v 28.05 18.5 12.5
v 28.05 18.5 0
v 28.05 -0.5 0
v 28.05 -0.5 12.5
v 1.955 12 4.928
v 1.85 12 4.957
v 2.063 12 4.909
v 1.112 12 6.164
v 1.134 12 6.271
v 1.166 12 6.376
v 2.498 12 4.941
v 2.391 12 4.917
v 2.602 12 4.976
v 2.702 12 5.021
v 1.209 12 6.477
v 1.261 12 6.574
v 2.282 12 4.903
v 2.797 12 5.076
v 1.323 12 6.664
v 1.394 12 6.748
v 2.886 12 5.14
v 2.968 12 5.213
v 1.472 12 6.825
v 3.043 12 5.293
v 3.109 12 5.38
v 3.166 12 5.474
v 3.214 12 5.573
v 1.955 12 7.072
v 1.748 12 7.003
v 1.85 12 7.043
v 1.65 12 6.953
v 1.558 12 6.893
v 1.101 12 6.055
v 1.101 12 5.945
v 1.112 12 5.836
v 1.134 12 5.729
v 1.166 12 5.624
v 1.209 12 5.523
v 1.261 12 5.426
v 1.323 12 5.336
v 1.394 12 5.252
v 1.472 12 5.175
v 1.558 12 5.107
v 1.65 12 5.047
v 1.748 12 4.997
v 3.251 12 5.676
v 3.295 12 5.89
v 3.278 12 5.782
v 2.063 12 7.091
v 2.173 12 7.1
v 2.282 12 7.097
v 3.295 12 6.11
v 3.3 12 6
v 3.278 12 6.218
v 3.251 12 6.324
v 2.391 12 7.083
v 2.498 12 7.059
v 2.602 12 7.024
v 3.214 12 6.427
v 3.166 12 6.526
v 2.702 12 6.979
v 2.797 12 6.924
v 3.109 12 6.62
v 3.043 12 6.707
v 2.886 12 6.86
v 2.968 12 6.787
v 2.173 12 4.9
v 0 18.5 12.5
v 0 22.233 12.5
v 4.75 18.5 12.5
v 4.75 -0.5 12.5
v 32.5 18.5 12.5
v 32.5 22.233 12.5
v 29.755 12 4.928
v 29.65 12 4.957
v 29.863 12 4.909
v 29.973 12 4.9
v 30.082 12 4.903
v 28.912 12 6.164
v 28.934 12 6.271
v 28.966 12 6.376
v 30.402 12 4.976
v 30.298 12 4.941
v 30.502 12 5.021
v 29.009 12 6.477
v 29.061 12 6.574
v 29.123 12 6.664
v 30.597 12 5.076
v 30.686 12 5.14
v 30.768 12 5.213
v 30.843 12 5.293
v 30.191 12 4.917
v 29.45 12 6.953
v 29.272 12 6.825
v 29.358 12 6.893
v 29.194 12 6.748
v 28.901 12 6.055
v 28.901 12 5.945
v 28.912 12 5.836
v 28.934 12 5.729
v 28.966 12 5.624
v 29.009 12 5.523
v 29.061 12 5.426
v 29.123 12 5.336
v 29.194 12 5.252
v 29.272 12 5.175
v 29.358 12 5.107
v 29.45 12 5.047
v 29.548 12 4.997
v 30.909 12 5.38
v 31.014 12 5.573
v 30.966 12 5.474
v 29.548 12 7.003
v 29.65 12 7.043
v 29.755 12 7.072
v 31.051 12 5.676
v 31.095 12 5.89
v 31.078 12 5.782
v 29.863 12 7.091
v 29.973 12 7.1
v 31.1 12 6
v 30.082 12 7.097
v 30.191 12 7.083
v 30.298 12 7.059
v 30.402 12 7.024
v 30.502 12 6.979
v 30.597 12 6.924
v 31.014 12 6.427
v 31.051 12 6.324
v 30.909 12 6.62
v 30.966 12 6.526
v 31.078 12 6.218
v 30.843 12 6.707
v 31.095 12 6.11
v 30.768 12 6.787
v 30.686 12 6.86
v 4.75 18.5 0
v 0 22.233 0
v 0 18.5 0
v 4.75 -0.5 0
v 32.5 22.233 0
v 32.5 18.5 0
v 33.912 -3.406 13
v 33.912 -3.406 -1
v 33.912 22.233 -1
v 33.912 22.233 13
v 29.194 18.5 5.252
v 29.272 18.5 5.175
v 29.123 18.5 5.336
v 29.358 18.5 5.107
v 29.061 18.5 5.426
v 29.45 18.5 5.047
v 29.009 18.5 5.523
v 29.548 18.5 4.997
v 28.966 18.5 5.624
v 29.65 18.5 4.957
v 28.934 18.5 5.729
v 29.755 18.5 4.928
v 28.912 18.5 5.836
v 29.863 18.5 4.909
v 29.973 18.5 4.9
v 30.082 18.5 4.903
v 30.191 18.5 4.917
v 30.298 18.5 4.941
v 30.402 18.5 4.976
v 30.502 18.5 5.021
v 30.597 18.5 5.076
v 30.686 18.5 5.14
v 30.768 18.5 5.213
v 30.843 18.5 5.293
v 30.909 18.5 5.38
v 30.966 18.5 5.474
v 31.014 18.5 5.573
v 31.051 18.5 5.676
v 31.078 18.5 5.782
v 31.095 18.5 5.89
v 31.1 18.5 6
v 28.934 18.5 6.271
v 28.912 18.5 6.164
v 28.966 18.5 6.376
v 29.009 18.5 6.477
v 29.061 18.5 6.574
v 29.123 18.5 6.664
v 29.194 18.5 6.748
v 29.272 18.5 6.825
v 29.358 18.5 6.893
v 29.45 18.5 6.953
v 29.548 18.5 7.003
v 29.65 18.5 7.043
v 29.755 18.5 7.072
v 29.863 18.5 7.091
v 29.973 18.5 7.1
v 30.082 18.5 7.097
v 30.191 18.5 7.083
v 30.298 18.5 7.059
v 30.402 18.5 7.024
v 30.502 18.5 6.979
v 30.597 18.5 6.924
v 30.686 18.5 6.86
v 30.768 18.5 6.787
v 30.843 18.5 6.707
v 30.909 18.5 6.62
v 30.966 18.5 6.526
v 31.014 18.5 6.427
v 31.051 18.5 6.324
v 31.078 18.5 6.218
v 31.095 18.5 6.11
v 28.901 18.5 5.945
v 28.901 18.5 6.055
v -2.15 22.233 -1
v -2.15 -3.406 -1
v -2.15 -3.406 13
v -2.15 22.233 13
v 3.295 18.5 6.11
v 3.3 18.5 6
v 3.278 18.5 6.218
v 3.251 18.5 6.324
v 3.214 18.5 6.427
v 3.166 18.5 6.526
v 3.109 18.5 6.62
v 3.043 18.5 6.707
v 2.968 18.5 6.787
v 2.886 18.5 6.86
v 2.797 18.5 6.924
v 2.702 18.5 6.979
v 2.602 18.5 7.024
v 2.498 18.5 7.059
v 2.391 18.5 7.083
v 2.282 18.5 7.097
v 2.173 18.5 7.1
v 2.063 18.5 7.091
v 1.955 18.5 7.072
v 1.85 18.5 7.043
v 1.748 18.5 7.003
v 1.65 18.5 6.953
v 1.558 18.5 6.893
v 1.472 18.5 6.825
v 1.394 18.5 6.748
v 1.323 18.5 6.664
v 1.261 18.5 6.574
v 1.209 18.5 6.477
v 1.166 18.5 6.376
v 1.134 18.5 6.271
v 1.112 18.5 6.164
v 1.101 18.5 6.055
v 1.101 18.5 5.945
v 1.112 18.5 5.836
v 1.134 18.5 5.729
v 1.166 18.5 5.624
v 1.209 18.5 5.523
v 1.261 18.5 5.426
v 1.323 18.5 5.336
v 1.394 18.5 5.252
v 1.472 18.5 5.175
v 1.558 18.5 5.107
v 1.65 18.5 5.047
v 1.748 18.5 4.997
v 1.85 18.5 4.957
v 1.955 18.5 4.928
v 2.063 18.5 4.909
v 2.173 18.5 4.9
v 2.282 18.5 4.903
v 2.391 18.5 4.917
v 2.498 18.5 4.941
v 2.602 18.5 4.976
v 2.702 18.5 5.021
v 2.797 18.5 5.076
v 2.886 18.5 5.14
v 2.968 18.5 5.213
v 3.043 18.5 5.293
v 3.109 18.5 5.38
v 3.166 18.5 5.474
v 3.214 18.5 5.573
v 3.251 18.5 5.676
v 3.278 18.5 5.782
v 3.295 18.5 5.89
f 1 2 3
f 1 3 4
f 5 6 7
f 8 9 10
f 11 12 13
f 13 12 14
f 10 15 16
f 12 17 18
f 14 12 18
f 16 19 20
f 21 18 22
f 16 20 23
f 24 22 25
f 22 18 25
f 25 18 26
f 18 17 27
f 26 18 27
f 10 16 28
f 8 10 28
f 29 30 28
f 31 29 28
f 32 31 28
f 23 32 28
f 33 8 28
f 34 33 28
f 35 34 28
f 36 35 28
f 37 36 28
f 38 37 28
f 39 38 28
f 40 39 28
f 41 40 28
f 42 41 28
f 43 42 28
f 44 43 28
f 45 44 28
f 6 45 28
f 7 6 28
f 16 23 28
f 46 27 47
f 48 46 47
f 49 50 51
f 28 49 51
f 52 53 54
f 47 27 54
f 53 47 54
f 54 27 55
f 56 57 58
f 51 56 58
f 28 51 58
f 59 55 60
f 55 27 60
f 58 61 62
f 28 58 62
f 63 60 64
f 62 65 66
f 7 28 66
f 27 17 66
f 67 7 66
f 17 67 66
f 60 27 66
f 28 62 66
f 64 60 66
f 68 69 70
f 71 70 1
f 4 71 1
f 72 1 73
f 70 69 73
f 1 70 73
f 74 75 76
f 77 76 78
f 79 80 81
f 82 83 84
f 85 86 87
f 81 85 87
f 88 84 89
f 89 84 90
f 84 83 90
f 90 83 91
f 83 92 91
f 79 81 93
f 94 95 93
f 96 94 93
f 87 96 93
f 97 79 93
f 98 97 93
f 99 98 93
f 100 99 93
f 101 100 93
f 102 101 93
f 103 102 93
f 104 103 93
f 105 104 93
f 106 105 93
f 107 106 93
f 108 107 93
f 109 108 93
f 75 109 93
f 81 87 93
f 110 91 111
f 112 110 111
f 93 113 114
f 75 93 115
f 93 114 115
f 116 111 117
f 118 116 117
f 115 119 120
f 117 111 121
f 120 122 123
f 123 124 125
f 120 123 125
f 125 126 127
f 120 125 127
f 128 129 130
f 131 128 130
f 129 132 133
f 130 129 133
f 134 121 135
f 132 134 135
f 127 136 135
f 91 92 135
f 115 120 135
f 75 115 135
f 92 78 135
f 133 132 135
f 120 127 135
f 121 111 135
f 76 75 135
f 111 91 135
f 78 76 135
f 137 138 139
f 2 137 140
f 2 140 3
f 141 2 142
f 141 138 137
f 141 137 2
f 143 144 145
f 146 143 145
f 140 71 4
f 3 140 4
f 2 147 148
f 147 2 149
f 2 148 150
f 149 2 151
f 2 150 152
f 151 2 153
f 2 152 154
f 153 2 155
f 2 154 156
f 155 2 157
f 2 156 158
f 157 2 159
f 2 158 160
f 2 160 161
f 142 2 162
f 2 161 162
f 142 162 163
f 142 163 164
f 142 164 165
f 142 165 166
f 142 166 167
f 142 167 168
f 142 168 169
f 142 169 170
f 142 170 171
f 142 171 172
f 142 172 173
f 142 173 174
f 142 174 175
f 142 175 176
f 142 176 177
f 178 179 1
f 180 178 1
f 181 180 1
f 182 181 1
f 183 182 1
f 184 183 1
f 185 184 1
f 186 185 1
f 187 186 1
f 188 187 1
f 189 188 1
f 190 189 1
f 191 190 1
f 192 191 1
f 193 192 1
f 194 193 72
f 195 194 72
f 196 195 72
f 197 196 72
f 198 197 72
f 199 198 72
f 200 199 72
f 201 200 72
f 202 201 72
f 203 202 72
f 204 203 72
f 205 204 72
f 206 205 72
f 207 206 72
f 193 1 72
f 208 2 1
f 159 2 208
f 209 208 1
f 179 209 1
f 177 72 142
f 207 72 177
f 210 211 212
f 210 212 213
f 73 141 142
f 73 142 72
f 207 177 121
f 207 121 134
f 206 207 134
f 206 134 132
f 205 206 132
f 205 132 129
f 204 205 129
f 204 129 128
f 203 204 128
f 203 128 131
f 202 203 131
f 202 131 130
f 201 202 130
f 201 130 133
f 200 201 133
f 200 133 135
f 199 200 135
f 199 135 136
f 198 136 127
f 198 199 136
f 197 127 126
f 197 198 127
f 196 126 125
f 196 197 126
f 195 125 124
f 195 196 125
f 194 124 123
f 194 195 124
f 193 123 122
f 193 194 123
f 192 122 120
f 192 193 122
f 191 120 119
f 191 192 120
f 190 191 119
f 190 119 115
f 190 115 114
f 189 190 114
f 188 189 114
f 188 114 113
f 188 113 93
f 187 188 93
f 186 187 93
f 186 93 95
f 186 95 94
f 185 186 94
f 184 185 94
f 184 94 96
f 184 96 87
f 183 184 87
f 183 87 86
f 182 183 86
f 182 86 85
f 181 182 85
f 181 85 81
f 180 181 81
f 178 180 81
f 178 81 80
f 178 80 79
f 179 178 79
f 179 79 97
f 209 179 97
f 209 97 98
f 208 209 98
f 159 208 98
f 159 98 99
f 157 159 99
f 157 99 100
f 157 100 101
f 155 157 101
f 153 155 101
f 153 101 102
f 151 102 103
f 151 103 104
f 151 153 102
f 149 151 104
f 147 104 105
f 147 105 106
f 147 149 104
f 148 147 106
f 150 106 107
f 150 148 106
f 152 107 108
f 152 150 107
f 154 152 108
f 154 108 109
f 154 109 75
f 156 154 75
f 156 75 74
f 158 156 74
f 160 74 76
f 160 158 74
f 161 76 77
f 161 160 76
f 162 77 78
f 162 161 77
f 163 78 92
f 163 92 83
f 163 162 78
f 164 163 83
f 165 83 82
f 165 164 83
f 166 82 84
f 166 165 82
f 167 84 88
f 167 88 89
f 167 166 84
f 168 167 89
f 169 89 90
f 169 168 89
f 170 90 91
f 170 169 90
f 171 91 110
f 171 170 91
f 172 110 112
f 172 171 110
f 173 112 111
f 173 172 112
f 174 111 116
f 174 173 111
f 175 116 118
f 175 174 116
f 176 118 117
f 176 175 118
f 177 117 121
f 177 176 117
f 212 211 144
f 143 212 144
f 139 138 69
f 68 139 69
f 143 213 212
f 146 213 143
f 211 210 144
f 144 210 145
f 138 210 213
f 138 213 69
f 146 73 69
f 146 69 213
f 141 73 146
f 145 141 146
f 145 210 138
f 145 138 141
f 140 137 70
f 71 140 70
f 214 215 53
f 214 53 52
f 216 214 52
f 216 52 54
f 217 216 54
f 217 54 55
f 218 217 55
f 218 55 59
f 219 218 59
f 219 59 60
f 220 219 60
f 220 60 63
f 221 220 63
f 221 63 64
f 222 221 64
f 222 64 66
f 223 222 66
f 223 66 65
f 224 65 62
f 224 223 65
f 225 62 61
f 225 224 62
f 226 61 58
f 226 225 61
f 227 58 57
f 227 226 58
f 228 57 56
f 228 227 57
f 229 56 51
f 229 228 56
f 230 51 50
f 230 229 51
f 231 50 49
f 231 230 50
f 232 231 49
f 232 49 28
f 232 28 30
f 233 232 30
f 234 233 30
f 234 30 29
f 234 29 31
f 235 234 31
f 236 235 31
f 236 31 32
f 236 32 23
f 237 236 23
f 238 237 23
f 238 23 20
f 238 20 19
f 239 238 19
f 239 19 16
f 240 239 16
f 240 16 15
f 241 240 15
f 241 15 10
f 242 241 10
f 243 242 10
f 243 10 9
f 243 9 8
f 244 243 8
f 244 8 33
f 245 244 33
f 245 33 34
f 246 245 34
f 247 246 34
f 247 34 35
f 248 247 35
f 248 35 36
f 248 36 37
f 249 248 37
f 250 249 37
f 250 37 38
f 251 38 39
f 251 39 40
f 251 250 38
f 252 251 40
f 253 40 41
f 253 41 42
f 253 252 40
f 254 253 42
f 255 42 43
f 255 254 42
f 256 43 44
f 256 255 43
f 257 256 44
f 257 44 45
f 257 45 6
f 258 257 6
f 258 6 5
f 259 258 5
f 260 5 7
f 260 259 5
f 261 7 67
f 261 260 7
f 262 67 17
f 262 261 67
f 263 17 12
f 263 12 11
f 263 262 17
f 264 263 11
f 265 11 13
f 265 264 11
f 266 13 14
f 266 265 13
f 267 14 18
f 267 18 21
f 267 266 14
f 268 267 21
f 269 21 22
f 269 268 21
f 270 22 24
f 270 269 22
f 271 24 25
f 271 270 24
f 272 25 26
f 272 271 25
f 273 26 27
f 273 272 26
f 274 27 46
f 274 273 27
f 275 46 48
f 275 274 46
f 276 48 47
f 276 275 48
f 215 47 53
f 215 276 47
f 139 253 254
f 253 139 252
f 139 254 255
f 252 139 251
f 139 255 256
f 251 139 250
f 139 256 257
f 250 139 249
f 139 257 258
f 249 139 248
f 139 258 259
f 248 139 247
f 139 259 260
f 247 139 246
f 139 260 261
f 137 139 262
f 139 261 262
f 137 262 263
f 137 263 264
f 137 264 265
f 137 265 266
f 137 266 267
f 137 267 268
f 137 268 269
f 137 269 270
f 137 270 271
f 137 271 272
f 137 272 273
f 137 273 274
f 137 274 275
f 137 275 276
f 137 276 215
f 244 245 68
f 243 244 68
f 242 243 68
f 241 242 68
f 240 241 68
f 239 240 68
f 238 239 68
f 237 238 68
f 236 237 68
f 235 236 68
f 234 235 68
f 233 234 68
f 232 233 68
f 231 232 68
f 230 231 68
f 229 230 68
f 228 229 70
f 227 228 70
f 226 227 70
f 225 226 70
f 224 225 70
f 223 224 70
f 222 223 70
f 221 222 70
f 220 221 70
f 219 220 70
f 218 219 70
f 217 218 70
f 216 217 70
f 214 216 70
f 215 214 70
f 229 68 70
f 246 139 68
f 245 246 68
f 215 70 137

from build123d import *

# Parameters (mm, degrees)
CYLINDER004_R     = 1.1
CYLINDER004_DEPTH = 10
CYLINDER005_R     = 1.1
CYLINDER005_DEPTH = 10
SKETCH007_W       = 23.3
SKETCH007_H       = 12.5
PAD007_DEPTH      = 19.5
SKETCH005_W       = 32.5
SKETCH005_H       = 12.5
PAD006_DEPTH      = 4.5
SKETCH006_W       = 36.061928
SKETCH006_H       = 25.639376
PAD005_DEPTH      = 14


with BuildPart() as cylinder004:
    # Cylinder004 → Cylinder004 (new body)
    with BuildSketch(Plane(origin=(30, 22, 6), x_dir=(1, 0, 0), z_dir=(0, -1, 0))):
        Circle(CYLINDER004_R)
    extrude(amount=CYLINDER004_DEPTH)


with BuildPart() as tornillossoporteservohollo001:
    # Cylinder005 → Cylinder005 (new body)
    with BuildSketch(Plane(origin=(2.2, 22, 6), x_dir=(1, 0, 0), z_dir=(0, -1, 0))):
        Circle(CYLINDER005_R)
    extrude(amount=CYLINDER005_DEPTH)

    # Fusion003: union Cylinder004
    add(cylinder004.part)


with BuildPart() as cortecuerpo001:
    # Sketch007 → Pad007 (new body)
    with BuildSketch(Plane.XZ):
        with Locations((16.4, 6.25)):
            Rectangle(SKETCH007_W, SKETCH007_H)
    extrude(amount=PAD007_DEPTH)


with BuildPart() as cortecuerpo001_1:
    # Body009 placement: moved
    add(cortecuerpo001.part.moved(Location((0, 19, 0))))


with BuildPart() as cortetornillos001:
    # Sketch005 → Pad006 (new body)
    with BuildSketch(Plane.XZ):
        with Locations((16.25, 6.25)):
            Rectangle(SKETCH005_W, SKETCH005_H)
    extrude(amount=PAD006_DEPTH)


with BuildPart() as cortetornillos001_1:
    # Body008 placement: moved
    add(cortetornillos001.part.moved(Location((0, 23, 0))))


with BuildPart() as soporteservocajamg90s:
    # Sketch006 → Pad005 (new body)
    with BuildSketch(Plane.XY):
        with Locations((15.881367, 9.413649)):
            Rectangle(SKETCH006_W, SKETCH006_H)
    extrude(amount=PAD005_DEPTH)


with BuildPart() as soporteservocajamg90s_1:
    # Body007 placement: moved
    add(soporteservocajamg90s.part.moved(Location((0, 0, -1))))

    # Cut003: cut CorteTornillos001
    add(cortetornillos001_1.part, mode=Mode.SUBTRACT)

    # Cut004: cut CorteCuerpo001
    add(cortecuerpo001_1.part, mode=Mode.SUBTRACT)

    # Cut005: cut tornillosSoporteServoHollo001
    add(tornillossoporteservohollo001.part, mode=Mode.SUBTRACT)


solid = soporteservocajamg90s_1.part
